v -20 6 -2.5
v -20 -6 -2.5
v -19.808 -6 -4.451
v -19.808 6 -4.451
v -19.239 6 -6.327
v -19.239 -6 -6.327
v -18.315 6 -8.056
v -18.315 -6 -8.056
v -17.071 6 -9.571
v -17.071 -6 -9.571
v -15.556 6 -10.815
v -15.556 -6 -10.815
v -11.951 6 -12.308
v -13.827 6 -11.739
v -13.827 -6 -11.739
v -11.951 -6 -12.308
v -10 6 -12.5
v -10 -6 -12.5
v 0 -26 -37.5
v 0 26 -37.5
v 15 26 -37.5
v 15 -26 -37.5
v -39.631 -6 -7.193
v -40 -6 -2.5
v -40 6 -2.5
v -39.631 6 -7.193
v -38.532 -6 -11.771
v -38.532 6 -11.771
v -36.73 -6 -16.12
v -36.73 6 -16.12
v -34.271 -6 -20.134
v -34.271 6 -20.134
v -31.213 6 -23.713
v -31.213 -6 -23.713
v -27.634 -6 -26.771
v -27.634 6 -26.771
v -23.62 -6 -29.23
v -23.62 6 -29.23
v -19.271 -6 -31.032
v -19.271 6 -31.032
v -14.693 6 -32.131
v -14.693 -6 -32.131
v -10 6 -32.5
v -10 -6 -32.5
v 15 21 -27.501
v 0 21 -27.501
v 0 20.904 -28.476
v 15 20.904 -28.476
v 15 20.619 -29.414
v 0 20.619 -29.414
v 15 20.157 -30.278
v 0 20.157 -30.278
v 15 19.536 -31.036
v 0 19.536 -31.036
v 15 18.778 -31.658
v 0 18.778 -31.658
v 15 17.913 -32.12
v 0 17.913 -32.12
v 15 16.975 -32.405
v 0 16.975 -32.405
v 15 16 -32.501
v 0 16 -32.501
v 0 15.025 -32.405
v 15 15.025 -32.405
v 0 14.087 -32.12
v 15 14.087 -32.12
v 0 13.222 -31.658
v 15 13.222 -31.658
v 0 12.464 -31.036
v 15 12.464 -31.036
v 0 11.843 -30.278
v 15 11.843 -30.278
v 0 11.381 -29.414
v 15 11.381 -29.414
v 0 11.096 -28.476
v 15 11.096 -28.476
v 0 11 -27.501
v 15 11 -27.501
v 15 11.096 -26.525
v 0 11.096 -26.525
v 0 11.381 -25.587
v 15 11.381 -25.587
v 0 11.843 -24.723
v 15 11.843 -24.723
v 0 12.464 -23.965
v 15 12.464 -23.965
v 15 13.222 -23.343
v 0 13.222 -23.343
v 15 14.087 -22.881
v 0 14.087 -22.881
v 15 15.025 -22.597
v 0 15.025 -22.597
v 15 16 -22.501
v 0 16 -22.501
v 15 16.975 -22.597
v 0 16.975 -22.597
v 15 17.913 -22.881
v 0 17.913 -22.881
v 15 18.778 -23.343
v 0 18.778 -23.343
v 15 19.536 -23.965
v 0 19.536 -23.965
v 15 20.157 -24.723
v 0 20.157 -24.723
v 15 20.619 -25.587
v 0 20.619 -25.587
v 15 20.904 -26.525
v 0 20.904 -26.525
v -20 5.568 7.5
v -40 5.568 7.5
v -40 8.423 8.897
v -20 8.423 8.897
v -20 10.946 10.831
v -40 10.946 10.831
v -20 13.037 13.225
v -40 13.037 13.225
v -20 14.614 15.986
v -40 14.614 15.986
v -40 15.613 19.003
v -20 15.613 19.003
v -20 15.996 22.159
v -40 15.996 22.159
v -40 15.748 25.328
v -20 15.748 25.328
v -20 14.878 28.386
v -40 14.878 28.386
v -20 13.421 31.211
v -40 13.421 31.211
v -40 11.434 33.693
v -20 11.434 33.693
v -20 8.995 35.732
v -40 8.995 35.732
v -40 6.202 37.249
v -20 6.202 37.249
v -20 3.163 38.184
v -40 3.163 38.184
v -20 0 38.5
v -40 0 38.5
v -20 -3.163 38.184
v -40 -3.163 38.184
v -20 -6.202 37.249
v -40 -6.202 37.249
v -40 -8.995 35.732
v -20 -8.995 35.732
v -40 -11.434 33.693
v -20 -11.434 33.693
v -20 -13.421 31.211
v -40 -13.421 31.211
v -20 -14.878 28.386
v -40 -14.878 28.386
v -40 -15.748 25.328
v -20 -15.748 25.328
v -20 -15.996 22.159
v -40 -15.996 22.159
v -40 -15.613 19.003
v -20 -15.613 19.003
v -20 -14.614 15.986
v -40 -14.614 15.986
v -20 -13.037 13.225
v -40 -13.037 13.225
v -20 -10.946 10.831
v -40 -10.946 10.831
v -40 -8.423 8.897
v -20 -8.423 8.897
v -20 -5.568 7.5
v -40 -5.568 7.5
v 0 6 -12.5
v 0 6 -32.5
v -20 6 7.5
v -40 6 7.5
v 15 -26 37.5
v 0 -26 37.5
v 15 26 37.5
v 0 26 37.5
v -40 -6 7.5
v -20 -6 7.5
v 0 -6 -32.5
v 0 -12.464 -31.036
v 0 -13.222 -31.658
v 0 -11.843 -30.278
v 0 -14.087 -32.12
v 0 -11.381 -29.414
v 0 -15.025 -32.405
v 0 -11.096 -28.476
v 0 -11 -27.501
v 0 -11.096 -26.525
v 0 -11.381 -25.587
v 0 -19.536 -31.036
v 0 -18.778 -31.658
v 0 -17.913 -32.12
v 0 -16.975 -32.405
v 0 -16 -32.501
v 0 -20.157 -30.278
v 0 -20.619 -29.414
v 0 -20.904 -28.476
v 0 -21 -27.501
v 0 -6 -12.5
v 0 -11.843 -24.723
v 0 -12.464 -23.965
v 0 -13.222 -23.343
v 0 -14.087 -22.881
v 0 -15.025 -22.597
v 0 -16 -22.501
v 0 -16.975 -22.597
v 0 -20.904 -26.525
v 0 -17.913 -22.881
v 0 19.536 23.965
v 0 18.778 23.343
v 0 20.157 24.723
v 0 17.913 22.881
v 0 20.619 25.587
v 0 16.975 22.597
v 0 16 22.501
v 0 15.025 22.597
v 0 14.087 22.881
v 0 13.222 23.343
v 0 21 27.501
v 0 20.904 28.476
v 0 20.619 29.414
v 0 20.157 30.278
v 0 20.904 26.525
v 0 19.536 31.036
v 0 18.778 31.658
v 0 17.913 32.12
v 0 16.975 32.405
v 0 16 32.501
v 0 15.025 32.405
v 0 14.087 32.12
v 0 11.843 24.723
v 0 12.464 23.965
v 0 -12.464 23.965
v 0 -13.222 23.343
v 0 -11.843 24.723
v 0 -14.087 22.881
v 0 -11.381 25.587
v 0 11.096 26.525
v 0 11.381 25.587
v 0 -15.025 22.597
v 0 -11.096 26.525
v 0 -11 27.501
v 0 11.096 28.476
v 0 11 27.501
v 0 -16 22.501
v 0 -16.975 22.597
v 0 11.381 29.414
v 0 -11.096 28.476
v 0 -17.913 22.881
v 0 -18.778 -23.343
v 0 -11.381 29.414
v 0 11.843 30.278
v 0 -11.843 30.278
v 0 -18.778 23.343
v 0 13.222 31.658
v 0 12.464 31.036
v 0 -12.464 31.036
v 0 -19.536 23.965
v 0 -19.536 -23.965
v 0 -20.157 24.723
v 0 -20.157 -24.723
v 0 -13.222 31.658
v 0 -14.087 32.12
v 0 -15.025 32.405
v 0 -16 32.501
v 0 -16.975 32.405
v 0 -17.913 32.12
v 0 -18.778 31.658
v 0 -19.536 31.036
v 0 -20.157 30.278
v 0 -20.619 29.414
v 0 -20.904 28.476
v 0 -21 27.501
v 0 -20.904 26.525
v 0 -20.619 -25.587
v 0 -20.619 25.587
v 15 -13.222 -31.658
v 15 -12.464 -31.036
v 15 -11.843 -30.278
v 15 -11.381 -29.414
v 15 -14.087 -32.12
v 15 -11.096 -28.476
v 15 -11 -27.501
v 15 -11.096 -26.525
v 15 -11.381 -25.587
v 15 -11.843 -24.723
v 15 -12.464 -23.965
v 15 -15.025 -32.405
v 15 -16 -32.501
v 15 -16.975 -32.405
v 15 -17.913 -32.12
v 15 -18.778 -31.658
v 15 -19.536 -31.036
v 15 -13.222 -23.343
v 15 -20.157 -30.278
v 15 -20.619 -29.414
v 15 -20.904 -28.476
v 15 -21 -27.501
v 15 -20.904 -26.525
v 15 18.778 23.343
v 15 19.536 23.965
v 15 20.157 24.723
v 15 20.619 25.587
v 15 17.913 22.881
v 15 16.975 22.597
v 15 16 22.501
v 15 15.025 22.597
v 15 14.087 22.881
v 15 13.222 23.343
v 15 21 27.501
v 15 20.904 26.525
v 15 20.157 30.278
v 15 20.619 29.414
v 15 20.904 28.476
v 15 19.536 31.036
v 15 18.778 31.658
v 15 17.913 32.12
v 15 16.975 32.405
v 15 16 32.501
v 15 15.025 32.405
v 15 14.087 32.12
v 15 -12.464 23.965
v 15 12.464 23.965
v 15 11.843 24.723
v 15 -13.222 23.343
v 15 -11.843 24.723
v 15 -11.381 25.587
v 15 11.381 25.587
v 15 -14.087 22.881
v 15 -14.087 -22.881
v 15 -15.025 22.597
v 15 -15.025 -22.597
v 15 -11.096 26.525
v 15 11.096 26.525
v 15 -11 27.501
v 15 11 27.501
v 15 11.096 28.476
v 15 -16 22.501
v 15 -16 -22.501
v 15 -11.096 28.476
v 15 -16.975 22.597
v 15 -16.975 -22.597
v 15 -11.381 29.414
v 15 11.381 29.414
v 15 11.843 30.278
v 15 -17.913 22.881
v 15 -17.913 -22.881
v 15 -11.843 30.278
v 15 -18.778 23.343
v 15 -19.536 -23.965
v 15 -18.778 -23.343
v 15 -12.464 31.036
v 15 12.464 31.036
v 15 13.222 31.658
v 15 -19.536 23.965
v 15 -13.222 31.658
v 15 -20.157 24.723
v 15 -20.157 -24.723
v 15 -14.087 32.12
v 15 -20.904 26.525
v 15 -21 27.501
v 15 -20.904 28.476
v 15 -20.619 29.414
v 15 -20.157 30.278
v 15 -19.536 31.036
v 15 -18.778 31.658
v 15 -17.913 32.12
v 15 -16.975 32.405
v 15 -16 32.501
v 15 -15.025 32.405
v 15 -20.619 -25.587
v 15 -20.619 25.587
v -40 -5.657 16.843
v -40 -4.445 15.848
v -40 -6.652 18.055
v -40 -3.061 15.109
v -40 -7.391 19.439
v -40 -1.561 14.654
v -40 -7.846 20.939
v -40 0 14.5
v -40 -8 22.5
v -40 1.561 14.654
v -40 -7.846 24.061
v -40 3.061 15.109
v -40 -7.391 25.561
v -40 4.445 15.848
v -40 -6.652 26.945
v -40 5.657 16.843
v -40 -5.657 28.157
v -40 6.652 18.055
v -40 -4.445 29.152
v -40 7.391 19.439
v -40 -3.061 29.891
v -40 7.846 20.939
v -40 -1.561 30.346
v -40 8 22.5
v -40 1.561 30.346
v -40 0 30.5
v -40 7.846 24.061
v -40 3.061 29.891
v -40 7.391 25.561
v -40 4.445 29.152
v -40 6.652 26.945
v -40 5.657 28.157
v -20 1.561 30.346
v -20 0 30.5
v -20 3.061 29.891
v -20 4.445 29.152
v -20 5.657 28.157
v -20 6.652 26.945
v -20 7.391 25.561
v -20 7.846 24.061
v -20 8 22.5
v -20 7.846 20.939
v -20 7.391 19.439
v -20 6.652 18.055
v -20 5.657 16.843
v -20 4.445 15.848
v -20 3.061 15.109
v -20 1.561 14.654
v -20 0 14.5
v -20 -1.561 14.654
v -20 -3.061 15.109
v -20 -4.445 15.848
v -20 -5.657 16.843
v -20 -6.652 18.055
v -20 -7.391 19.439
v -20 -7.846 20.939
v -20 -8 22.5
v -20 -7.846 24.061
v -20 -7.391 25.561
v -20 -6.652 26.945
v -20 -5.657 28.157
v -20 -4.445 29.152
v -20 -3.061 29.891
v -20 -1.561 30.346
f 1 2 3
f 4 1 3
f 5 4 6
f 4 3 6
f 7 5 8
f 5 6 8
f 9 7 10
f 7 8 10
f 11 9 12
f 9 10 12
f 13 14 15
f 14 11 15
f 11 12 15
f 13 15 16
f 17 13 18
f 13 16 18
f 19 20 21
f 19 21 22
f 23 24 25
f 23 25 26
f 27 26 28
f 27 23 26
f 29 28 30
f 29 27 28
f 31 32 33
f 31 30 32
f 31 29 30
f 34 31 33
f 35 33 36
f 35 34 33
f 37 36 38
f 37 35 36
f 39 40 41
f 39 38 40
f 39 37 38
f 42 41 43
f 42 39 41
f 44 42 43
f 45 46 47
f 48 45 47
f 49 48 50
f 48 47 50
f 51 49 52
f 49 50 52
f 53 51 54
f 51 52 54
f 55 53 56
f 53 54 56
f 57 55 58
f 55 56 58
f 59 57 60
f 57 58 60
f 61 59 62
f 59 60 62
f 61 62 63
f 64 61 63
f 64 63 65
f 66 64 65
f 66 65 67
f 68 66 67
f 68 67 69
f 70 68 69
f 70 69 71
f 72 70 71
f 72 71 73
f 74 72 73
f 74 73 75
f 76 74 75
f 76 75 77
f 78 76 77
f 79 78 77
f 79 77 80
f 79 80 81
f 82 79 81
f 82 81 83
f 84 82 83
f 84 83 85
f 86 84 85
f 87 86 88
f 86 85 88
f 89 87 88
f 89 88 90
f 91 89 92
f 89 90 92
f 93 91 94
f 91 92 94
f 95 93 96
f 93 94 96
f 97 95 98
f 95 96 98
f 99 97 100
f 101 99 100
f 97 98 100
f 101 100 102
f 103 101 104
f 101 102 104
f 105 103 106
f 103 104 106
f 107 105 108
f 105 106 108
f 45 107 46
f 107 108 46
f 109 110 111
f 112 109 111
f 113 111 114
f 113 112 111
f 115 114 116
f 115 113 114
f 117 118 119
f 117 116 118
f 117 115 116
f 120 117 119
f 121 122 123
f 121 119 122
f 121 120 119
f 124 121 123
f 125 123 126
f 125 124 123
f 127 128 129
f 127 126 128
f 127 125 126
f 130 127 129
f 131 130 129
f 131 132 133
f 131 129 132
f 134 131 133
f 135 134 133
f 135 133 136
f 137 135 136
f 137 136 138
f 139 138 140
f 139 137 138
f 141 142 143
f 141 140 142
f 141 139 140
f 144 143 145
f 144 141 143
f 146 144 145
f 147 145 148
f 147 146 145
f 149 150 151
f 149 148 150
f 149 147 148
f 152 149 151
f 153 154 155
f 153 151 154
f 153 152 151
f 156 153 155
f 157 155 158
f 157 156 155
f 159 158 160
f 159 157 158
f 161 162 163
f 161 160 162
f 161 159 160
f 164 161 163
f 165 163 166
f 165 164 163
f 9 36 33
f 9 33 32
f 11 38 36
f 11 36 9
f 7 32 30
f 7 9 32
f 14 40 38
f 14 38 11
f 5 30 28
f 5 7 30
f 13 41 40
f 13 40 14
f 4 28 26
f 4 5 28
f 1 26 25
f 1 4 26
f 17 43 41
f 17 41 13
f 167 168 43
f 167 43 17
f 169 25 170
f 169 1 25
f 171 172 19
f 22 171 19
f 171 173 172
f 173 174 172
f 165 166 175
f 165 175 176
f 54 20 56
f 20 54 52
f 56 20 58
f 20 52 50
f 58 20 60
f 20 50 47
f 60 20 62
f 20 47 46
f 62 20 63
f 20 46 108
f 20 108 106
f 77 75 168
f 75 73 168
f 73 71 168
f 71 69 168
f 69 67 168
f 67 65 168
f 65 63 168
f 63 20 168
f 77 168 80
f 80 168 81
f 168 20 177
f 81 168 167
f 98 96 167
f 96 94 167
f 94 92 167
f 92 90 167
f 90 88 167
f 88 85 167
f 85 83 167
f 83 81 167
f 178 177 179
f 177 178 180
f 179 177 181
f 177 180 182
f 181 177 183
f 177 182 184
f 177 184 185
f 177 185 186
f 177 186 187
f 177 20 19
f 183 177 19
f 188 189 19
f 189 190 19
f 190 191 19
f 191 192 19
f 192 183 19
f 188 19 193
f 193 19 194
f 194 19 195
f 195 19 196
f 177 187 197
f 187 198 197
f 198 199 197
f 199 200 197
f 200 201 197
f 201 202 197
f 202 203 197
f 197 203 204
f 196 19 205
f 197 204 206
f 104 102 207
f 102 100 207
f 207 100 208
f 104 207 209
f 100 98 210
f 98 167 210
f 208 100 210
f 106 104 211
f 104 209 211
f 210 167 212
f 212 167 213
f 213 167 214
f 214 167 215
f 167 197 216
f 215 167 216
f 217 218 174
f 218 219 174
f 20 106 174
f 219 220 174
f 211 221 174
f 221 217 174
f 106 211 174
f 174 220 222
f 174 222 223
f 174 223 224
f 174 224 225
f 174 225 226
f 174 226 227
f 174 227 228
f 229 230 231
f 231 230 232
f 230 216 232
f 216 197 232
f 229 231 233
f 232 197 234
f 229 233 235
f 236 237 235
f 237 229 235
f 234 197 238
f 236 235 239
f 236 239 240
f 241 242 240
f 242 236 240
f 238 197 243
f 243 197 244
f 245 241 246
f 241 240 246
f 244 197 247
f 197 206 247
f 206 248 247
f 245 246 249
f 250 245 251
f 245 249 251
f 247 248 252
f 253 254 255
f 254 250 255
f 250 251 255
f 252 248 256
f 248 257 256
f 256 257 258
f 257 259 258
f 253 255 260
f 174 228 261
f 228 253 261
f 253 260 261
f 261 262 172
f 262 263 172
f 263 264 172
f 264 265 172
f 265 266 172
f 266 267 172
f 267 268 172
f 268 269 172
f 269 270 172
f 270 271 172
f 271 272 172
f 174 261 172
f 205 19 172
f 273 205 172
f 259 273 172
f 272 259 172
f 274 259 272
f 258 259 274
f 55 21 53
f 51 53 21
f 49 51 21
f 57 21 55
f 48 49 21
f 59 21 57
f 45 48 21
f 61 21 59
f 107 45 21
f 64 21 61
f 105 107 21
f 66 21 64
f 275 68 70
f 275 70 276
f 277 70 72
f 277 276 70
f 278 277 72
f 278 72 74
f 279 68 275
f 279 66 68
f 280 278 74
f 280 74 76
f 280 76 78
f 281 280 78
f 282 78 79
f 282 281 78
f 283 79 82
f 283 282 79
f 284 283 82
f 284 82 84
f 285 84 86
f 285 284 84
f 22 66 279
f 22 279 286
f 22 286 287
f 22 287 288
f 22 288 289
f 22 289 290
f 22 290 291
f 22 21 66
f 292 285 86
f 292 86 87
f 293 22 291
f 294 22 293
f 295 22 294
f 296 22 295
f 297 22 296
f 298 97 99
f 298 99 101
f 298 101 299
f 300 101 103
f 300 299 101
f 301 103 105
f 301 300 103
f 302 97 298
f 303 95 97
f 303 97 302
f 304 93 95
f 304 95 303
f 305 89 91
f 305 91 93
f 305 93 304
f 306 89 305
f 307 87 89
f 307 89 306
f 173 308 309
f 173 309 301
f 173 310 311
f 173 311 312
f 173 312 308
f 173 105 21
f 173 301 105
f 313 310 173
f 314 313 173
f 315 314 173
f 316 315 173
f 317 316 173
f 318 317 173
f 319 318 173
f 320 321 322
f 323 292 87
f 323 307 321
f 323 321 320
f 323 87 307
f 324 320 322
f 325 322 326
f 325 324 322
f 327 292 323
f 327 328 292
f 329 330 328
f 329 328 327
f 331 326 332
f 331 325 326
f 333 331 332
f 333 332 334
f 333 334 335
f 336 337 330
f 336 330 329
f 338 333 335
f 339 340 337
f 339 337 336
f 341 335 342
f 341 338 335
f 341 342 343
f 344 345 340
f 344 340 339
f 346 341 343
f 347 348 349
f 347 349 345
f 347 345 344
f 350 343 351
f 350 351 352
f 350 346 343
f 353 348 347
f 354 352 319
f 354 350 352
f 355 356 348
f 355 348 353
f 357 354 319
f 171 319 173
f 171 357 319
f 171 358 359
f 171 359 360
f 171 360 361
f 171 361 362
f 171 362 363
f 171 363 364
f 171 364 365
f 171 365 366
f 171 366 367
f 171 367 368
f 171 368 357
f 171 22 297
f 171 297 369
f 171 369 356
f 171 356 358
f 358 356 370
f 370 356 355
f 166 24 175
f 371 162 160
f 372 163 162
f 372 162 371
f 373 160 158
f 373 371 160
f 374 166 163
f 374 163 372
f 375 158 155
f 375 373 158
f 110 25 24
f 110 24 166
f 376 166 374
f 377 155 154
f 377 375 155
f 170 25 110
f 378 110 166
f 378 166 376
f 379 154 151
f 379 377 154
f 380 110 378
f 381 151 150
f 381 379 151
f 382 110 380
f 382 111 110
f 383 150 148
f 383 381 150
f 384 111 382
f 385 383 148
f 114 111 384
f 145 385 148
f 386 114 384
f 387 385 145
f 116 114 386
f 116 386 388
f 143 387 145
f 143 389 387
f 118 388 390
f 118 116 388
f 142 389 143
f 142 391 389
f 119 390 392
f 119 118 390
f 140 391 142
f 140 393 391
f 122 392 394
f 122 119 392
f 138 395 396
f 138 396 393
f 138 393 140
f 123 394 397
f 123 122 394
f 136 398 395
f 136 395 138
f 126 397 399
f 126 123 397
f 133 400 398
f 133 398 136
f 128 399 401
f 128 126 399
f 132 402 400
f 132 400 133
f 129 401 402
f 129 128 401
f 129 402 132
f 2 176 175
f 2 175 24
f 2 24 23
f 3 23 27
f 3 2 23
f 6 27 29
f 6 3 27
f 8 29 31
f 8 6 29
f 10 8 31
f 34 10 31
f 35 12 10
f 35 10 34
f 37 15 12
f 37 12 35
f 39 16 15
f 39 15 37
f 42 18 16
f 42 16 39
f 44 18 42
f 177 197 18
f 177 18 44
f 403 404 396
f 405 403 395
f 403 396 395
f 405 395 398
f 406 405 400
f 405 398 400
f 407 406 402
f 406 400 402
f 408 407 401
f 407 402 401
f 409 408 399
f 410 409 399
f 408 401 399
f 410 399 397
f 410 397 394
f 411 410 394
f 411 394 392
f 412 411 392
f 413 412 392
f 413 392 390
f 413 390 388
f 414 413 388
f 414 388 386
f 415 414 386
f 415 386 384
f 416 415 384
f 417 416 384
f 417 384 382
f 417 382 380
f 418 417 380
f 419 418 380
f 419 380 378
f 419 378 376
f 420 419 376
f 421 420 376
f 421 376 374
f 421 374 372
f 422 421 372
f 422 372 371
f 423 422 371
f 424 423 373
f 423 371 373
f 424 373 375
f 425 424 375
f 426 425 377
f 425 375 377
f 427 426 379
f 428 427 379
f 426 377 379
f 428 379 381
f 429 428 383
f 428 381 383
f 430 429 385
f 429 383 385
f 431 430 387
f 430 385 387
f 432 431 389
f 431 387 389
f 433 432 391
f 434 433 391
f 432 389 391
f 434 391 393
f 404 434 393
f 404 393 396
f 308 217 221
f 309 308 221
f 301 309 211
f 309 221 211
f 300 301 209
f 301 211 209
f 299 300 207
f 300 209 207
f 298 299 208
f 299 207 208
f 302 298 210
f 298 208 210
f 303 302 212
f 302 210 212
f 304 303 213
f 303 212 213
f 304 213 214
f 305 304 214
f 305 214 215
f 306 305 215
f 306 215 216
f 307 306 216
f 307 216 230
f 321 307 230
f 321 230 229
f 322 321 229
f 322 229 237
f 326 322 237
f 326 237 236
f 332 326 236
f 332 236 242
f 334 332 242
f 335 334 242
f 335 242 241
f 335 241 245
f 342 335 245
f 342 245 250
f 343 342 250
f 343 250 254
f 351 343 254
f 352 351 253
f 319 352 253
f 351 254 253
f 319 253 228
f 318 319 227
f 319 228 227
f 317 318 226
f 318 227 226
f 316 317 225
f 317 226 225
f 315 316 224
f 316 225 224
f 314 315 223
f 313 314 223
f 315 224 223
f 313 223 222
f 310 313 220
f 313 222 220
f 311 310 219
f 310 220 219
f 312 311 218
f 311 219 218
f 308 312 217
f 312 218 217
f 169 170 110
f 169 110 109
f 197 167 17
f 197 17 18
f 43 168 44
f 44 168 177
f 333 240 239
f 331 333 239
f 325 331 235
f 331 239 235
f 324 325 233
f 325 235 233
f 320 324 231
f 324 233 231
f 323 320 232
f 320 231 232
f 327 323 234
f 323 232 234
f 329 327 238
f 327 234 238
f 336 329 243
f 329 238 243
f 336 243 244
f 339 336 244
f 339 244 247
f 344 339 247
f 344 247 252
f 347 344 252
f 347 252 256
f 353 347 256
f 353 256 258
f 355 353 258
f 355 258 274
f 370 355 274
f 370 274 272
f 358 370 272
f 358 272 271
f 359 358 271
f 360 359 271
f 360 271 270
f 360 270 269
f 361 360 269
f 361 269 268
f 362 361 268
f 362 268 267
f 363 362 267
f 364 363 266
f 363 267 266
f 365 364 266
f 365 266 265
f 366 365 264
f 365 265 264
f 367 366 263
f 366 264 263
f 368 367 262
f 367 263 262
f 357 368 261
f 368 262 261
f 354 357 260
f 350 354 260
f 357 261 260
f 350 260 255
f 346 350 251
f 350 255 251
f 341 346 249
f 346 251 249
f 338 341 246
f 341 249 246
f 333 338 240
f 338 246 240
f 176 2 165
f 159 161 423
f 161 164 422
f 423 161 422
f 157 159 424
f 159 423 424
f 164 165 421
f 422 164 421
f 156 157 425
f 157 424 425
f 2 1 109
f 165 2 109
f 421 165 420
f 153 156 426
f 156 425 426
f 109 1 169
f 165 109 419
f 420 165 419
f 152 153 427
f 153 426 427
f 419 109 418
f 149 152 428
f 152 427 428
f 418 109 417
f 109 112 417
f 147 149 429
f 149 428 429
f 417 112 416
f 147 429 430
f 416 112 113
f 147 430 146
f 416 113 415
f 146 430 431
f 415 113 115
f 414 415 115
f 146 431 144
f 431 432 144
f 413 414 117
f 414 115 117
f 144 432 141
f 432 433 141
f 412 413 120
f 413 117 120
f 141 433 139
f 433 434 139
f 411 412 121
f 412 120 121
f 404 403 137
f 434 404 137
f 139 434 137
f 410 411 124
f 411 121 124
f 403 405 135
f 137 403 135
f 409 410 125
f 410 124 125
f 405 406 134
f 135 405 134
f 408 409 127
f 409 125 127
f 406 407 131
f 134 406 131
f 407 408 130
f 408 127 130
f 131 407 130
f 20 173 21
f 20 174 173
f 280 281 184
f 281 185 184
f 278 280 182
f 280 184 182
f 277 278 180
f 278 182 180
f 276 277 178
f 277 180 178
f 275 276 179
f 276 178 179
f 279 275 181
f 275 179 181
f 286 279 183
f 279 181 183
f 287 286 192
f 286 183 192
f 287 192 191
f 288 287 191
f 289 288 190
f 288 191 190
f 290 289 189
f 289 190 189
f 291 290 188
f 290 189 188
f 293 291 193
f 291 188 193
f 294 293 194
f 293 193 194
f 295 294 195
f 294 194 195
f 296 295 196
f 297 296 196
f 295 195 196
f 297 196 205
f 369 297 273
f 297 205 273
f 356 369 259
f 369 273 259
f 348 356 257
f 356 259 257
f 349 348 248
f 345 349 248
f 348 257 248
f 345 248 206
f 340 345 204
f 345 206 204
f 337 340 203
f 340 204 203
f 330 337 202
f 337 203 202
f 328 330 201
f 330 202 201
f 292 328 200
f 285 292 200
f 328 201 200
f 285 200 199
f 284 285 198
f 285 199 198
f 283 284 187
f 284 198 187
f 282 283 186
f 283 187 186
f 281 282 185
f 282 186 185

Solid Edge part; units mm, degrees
sketch "Sketch1" plane through (0, 0, 0) normal (1, 0, 0) x (0, 1, 0)
  line L0 (-26, 37.5) -> (-26, 0)
  line L1 (-26, -37.5) -> (-26, 0)
  line L2 (-16, -37.5) -> (-26, -37.5)
  line L3 (0, -37.5) -> (-16, -37.5)
  line L4 (0, -37.5) -> (16, -37.5)
  line L5 (16, -37.5) -> (26, -37.5)
  line L6 (26, -37.5) -> (26, 0)
  line L7 (26, 37.5) -> (26, 0)
  line L8 (16, 37.5) -> (26, 37.5)
  line L9 (0, 37.5) -> (16, 37.5)
  line L10 (0, 37.5) -> (-16, 37.5)
  line L11 (-16, 37.5) -> (-26, 37.5)
extrude "Protrusion1" add sketch "Sketch1" along normal blind 15
sketch "Sketch2" plane through (0, 0, 0) normal (1, 0, 0) x (0, 1, 0)
  circle A0 centre (-16, 27.5006) radius 5
  circle A1 centre (-16, -27.5006) radius 5
  circle A2 centre (16, -27.5006) radius 5
  circle A3 centre (16, 27.5006) radius 5
extrude "ExtrudedCutout_1" cut sketch "Sketch2" along normal blind 26.9909
sketch "Sketch3" plane through (0, 0, 0) normal (1, 0, 0) x (0, 1, 0)
  line L0 (6, -32.5) -> (6, -12.5)
  line L1 (6, -12.5) -> (-6, -12.5)
  line L2 (-6, -12.5) -> (-6, -32.5)
  line L3 (0, -32.5) -> (-6, -32.5)
  line L4 (0, -32.5) -> (6, -32.5)
extrude "ExtrudedProtrusion_2" add sketch "Sketch3" against normal blind 10
sketch "Sketch4" plane through (-5, -6, -22.5) normal (0, -1, 0) x (-1, 0, 0)
  line L0 (15, -20) -> (35, -20)
  line L1 (5, -10) -> (5, 10)
  arc A0 (5, 10) -> (35, -20) centre (5, -20) cw
  arc A1 (5, -10) -> (15, -20) centre (5, -20) cw
extrude "ExtrudedProtrusion_4" add sketch "Sketch4" against normal blind 12
sketch "Sketch5" plane through (-30, 0, -2.5) normal (0, 0, 1) x (0, 1, 0)
  line L0 (6, -10) -> (6, 10)
  line L1 (6, 10) -> (-6, 10)
  line L2 (-6, 10) -> (-6, -10)
  line L3 (-6, -10) -> (6, -10)
extrude "ExtrudedProtrusion_5" add sketch "Sketch5" along normal blind 10
sketch "Sketch6" plane through (0, 0, 0) normal (0, -1, 0) x (1, 0, 0)
  line L0 (-20, 30.5) -> (-40, 30.5)
  line L1 (-40, 30.5) -> (-40, 38.5)
  line L2 (-40, 38.5) -> (-20, 38.5)
  line L3 (-20, 38.5) -> (-20, 30.5)
revolve "RevolvedCutout1" cut sketch "Sketch6" angle 360 about axis through (-15.4193, 0, 22.5) along (-1, 0, 0)
sketch "Sketch7" plane through (0, 0, 0) normal (0, -1, 0) x (1, 0, 0)
  line L0 (-40, 30.5) -> (-40, 38.5)
  line L1 (-40, 38.5) -> (-20, 38.5)
  line L2 (-20, 38.5) -> (-20, 30.5)
  line L3 (-20, 30.5) -> (-40, 30.5)
revolve "RevolvedProtrusion1" add sketch "Sketch7" angle 360 about axis through (-15.4193, 0, 22.5) along (-1, 0, 0)
